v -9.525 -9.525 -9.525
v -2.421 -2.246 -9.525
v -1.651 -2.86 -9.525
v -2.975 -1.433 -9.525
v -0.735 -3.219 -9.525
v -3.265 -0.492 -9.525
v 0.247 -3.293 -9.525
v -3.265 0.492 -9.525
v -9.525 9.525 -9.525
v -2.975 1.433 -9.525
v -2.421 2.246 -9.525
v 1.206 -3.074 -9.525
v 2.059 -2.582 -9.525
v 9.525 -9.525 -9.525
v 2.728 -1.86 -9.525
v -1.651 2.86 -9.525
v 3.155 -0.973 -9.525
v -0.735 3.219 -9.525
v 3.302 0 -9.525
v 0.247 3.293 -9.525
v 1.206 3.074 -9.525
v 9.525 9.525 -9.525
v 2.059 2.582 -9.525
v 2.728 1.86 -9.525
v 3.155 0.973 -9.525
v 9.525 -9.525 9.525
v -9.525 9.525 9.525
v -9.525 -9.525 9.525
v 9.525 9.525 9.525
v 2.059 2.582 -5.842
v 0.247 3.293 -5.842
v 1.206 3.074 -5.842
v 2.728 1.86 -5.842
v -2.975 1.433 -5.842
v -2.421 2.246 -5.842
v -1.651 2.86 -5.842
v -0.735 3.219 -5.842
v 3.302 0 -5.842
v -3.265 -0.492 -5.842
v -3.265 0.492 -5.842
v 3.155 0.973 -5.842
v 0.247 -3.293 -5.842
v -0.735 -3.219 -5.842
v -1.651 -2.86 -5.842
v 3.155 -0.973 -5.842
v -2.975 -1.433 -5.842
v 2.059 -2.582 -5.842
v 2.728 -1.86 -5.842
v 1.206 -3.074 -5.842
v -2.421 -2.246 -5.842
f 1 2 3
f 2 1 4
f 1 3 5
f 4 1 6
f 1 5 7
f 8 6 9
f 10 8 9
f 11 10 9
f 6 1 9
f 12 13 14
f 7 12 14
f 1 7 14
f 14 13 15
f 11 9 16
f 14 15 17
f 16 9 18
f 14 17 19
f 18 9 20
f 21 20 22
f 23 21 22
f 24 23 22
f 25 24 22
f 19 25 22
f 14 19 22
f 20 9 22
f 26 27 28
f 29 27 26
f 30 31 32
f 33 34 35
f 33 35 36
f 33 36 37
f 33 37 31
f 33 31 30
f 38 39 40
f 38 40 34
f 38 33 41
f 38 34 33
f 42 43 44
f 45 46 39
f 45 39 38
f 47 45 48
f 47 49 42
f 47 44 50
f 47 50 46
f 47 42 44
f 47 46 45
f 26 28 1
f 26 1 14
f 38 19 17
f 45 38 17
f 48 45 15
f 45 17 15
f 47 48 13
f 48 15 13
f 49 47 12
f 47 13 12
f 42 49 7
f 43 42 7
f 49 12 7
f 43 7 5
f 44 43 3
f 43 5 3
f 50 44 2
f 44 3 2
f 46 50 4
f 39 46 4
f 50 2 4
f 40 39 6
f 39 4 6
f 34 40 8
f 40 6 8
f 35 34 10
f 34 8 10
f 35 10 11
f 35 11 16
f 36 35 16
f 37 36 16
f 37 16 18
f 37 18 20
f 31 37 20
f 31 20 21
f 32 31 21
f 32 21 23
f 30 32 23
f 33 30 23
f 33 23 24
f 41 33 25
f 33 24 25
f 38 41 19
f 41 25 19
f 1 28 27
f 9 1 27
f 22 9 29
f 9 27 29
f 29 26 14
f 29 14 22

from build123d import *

# Parameters (mm, degrees)
F0_W     = 19.05
F0_H     = 19.05
F1_DEPTH = 9.525
F2_R     = 3.302
F3_DEPTH = 3.683


with BuildPart() as f1:
    # F0 (on Top) → F1 (new body, symmetric)
    with BuildSketch(Plane.XY):
        Rectangle(F0_W, F0_H)
    extrude(amount=F1_DEPTH, both=True)

    # F2 (on face) → F3 (cut)
    with BuildSketch(Plane(origin=(0, 0, -9.525), x_dir=(1, 0, 0), z_dir=(0, 0, -1))):
        Circle(F2_R)
    extrude(amount=-F3_DEPTH, mode=Mode.SUBTRACT)


solid = f1.part
